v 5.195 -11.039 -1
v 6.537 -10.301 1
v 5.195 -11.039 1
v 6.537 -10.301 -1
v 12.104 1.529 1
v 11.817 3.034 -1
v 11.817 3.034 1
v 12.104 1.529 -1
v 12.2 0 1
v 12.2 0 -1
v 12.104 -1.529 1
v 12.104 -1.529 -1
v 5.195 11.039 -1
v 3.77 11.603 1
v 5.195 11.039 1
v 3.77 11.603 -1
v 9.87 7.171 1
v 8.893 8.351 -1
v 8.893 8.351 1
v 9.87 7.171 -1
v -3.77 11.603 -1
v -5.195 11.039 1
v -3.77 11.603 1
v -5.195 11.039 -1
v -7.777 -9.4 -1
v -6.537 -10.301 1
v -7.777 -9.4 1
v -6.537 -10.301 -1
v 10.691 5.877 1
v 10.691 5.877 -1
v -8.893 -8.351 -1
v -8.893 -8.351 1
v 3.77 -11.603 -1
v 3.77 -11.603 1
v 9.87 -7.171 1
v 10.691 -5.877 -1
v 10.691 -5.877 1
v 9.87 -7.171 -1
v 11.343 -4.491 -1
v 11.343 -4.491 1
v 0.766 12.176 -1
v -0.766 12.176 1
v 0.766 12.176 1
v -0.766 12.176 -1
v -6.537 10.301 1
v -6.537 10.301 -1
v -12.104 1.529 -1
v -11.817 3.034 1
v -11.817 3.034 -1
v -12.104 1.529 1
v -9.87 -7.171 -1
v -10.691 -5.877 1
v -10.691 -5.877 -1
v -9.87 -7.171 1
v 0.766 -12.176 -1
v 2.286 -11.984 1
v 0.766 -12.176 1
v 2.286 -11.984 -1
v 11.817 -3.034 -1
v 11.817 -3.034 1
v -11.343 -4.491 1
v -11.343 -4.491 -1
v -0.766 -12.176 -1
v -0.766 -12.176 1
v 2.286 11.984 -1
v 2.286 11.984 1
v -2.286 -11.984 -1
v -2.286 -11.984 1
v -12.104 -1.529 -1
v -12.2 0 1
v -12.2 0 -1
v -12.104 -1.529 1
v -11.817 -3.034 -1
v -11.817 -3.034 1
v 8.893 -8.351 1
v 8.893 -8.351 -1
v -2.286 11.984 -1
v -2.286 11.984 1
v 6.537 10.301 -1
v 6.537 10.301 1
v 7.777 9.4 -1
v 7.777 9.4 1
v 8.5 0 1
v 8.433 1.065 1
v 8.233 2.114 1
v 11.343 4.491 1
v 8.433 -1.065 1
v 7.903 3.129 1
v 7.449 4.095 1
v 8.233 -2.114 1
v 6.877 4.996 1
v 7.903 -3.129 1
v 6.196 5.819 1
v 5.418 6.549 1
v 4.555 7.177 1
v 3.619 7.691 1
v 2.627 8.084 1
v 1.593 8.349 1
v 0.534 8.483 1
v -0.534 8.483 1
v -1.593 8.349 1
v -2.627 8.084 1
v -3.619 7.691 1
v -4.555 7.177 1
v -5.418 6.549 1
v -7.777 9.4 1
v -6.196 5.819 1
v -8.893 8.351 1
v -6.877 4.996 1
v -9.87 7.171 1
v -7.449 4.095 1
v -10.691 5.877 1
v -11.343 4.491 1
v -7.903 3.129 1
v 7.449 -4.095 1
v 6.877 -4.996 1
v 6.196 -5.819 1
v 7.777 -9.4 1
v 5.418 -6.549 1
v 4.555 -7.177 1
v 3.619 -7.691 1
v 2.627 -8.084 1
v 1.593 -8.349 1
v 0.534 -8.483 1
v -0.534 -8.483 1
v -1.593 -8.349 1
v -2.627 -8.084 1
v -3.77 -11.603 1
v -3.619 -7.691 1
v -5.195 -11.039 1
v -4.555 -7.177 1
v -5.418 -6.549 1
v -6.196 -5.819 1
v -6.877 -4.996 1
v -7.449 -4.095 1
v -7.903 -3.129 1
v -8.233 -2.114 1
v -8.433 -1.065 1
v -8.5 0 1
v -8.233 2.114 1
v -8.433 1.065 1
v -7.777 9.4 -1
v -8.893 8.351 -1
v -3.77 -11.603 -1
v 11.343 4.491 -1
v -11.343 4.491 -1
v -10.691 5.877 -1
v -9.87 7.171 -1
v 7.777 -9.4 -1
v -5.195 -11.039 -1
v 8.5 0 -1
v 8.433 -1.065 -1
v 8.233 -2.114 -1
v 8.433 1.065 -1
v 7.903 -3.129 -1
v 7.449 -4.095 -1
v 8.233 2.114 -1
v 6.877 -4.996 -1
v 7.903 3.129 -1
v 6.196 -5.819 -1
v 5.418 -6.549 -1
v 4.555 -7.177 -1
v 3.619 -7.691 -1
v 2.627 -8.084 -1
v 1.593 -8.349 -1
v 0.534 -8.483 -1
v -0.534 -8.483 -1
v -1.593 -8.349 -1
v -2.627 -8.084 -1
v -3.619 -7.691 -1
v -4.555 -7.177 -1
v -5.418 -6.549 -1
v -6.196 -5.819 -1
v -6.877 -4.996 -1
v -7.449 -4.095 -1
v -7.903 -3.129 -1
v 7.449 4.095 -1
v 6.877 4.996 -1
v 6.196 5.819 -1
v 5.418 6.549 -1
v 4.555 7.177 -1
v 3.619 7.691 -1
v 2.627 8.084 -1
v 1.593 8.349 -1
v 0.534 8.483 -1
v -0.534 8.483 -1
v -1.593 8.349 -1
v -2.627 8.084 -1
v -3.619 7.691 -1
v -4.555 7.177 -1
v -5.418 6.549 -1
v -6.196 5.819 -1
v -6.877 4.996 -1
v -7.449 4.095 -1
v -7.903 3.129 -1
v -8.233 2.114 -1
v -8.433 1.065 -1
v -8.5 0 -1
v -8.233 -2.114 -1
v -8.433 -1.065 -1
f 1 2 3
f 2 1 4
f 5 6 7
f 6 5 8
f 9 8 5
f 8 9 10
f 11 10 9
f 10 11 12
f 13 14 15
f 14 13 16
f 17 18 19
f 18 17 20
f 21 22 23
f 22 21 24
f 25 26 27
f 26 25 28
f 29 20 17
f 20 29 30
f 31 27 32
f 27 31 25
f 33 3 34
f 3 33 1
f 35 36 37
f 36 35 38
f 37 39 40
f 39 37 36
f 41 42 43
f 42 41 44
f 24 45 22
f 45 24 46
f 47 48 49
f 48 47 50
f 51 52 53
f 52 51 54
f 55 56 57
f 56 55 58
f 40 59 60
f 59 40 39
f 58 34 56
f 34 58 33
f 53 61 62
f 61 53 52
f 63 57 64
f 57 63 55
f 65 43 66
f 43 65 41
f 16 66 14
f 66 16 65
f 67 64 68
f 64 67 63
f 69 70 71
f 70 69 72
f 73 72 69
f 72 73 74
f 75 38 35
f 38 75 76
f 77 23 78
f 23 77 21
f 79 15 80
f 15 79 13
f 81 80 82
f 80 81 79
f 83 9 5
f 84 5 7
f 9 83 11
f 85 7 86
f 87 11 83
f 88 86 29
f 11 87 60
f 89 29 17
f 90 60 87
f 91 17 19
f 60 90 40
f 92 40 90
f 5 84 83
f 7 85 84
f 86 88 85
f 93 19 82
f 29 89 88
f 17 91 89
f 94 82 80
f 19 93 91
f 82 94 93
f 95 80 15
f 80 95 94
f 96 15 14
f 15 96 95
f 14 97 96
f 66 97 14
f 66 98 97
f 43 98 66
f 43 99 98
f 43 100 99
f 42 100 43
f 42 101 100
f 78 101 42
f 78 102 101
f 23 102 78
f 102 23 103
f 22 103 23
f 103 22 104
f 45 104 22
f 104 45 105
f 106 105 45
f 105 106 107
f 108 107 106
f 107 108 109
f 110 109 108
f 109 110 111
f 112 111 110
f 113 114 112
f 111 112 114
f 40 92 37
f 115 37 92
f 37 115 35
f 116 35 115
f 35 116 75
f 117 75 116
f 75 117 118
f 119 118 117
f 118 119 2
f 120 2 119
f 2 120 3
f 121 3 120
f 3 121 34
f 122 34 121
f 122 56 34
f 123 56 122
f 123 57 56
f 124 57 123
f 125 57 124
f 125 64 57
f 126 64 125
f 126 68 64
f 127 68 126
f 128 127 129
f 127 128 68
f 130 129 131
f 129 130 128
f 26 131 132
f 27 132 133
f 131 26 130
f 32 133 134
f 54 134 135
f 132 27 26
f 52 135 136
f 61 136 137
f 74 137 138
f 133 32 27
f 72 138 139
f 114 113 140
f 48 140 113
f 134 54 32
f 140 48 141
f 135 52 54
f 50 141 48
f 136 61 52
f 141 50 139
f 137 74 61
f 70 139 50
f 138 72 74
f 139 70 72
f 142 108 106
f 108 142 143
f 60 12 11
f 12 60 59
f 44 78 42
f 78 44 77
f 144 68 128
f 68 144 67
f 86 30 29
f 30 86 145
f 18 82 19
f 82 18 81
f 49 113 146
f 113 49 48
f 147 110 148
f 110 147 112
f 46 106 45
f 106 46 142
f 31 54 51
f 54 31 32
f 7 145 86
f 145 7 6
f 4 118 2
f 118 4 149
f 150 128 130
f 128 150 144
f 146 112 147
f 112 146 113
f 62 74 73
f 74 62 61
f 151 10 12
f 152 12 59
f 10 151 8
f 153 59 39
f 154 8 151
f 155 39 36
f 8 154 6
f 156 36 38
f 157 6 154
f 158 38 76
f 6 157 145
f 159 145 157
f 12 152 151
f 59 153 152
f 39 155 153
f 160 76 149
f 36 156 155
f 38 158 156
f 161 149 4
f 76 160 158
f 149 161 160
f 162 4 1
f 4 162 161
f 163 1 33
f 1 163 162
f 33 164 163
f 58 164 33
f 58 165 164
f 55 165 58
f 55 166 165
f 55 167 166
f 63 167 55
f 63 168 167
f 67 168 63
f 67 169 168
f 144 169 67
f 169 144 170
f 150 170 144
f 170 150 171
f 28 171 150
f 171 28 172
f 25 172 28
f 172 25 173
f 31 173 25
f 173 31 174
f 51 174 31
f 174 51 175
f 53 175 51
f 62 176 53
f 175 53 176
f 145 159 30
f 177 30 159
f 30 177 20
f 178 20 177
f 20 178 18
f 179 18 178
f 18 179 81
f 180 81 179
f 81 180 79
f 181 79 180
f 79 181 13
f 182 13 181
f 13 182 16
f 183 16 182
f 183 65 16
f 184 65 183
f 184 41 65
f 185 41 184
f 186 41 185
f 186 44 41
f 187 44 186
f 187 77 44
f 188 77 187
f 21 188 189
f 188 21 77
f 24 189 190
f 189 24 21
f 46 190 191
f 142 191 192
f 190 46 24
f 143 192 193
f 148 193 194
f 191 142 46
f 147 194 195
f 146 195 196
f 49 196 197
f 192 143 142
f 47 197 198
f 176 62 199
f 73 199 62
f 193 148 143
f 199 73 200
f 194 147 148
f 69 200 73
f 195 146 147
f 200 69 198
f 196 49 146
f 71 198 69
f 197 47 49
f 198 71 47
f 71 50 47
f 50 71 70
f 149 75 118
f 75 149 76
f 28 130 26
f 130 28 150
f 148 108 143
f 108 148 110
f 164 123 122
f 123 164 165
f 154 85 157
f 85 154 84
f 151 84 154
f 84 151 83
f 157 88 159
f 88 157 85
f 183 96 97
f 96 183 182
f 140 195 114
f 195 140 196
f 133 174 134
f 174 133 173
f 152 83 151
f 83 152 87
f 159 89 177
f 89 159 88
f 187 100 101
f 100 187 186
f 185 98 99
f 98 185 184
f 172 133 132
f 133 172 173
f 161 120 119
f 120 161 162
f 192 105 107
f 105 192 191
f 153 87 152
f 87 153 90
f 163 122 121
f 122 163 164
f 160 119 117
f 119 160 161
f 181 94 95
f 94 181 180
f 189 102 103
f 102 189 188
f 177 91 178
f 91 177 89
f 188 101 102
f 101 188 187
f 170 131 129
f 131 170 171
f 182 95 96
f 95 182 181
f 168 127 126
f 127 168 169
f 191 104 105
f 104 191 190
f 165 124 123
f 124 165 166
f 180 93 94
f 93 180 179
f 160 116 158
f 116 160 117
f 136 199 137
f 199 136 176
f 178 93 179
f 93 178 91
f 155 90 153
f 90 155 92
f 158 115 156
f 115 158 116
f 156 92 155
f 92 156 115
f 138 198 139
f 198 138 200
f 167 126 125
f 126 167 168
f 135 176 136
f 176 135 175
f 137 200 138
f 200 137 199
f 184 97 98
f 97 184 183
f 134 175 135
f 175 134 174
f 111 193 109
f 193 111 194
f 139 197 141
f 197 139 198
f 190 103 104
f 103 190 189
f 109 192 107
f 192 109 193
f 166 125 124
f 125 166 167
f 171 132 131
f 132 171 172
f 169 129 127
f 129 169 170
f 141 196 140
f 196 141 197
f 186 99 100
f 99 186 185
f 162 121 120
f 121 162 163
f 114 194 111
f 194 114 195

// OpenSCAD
$fn = 50;


difference() {
	union() {
		translate(v = [0, 0, -1.0000000000]) {
			cylinder(h = 2, r = 12.2000000000);
		}
	}
	union() {
		translate(v = [0, 0, -1.0000000000]) {
			cylinder(h = 2, r = 8.5000000000);
		}
	}
}
